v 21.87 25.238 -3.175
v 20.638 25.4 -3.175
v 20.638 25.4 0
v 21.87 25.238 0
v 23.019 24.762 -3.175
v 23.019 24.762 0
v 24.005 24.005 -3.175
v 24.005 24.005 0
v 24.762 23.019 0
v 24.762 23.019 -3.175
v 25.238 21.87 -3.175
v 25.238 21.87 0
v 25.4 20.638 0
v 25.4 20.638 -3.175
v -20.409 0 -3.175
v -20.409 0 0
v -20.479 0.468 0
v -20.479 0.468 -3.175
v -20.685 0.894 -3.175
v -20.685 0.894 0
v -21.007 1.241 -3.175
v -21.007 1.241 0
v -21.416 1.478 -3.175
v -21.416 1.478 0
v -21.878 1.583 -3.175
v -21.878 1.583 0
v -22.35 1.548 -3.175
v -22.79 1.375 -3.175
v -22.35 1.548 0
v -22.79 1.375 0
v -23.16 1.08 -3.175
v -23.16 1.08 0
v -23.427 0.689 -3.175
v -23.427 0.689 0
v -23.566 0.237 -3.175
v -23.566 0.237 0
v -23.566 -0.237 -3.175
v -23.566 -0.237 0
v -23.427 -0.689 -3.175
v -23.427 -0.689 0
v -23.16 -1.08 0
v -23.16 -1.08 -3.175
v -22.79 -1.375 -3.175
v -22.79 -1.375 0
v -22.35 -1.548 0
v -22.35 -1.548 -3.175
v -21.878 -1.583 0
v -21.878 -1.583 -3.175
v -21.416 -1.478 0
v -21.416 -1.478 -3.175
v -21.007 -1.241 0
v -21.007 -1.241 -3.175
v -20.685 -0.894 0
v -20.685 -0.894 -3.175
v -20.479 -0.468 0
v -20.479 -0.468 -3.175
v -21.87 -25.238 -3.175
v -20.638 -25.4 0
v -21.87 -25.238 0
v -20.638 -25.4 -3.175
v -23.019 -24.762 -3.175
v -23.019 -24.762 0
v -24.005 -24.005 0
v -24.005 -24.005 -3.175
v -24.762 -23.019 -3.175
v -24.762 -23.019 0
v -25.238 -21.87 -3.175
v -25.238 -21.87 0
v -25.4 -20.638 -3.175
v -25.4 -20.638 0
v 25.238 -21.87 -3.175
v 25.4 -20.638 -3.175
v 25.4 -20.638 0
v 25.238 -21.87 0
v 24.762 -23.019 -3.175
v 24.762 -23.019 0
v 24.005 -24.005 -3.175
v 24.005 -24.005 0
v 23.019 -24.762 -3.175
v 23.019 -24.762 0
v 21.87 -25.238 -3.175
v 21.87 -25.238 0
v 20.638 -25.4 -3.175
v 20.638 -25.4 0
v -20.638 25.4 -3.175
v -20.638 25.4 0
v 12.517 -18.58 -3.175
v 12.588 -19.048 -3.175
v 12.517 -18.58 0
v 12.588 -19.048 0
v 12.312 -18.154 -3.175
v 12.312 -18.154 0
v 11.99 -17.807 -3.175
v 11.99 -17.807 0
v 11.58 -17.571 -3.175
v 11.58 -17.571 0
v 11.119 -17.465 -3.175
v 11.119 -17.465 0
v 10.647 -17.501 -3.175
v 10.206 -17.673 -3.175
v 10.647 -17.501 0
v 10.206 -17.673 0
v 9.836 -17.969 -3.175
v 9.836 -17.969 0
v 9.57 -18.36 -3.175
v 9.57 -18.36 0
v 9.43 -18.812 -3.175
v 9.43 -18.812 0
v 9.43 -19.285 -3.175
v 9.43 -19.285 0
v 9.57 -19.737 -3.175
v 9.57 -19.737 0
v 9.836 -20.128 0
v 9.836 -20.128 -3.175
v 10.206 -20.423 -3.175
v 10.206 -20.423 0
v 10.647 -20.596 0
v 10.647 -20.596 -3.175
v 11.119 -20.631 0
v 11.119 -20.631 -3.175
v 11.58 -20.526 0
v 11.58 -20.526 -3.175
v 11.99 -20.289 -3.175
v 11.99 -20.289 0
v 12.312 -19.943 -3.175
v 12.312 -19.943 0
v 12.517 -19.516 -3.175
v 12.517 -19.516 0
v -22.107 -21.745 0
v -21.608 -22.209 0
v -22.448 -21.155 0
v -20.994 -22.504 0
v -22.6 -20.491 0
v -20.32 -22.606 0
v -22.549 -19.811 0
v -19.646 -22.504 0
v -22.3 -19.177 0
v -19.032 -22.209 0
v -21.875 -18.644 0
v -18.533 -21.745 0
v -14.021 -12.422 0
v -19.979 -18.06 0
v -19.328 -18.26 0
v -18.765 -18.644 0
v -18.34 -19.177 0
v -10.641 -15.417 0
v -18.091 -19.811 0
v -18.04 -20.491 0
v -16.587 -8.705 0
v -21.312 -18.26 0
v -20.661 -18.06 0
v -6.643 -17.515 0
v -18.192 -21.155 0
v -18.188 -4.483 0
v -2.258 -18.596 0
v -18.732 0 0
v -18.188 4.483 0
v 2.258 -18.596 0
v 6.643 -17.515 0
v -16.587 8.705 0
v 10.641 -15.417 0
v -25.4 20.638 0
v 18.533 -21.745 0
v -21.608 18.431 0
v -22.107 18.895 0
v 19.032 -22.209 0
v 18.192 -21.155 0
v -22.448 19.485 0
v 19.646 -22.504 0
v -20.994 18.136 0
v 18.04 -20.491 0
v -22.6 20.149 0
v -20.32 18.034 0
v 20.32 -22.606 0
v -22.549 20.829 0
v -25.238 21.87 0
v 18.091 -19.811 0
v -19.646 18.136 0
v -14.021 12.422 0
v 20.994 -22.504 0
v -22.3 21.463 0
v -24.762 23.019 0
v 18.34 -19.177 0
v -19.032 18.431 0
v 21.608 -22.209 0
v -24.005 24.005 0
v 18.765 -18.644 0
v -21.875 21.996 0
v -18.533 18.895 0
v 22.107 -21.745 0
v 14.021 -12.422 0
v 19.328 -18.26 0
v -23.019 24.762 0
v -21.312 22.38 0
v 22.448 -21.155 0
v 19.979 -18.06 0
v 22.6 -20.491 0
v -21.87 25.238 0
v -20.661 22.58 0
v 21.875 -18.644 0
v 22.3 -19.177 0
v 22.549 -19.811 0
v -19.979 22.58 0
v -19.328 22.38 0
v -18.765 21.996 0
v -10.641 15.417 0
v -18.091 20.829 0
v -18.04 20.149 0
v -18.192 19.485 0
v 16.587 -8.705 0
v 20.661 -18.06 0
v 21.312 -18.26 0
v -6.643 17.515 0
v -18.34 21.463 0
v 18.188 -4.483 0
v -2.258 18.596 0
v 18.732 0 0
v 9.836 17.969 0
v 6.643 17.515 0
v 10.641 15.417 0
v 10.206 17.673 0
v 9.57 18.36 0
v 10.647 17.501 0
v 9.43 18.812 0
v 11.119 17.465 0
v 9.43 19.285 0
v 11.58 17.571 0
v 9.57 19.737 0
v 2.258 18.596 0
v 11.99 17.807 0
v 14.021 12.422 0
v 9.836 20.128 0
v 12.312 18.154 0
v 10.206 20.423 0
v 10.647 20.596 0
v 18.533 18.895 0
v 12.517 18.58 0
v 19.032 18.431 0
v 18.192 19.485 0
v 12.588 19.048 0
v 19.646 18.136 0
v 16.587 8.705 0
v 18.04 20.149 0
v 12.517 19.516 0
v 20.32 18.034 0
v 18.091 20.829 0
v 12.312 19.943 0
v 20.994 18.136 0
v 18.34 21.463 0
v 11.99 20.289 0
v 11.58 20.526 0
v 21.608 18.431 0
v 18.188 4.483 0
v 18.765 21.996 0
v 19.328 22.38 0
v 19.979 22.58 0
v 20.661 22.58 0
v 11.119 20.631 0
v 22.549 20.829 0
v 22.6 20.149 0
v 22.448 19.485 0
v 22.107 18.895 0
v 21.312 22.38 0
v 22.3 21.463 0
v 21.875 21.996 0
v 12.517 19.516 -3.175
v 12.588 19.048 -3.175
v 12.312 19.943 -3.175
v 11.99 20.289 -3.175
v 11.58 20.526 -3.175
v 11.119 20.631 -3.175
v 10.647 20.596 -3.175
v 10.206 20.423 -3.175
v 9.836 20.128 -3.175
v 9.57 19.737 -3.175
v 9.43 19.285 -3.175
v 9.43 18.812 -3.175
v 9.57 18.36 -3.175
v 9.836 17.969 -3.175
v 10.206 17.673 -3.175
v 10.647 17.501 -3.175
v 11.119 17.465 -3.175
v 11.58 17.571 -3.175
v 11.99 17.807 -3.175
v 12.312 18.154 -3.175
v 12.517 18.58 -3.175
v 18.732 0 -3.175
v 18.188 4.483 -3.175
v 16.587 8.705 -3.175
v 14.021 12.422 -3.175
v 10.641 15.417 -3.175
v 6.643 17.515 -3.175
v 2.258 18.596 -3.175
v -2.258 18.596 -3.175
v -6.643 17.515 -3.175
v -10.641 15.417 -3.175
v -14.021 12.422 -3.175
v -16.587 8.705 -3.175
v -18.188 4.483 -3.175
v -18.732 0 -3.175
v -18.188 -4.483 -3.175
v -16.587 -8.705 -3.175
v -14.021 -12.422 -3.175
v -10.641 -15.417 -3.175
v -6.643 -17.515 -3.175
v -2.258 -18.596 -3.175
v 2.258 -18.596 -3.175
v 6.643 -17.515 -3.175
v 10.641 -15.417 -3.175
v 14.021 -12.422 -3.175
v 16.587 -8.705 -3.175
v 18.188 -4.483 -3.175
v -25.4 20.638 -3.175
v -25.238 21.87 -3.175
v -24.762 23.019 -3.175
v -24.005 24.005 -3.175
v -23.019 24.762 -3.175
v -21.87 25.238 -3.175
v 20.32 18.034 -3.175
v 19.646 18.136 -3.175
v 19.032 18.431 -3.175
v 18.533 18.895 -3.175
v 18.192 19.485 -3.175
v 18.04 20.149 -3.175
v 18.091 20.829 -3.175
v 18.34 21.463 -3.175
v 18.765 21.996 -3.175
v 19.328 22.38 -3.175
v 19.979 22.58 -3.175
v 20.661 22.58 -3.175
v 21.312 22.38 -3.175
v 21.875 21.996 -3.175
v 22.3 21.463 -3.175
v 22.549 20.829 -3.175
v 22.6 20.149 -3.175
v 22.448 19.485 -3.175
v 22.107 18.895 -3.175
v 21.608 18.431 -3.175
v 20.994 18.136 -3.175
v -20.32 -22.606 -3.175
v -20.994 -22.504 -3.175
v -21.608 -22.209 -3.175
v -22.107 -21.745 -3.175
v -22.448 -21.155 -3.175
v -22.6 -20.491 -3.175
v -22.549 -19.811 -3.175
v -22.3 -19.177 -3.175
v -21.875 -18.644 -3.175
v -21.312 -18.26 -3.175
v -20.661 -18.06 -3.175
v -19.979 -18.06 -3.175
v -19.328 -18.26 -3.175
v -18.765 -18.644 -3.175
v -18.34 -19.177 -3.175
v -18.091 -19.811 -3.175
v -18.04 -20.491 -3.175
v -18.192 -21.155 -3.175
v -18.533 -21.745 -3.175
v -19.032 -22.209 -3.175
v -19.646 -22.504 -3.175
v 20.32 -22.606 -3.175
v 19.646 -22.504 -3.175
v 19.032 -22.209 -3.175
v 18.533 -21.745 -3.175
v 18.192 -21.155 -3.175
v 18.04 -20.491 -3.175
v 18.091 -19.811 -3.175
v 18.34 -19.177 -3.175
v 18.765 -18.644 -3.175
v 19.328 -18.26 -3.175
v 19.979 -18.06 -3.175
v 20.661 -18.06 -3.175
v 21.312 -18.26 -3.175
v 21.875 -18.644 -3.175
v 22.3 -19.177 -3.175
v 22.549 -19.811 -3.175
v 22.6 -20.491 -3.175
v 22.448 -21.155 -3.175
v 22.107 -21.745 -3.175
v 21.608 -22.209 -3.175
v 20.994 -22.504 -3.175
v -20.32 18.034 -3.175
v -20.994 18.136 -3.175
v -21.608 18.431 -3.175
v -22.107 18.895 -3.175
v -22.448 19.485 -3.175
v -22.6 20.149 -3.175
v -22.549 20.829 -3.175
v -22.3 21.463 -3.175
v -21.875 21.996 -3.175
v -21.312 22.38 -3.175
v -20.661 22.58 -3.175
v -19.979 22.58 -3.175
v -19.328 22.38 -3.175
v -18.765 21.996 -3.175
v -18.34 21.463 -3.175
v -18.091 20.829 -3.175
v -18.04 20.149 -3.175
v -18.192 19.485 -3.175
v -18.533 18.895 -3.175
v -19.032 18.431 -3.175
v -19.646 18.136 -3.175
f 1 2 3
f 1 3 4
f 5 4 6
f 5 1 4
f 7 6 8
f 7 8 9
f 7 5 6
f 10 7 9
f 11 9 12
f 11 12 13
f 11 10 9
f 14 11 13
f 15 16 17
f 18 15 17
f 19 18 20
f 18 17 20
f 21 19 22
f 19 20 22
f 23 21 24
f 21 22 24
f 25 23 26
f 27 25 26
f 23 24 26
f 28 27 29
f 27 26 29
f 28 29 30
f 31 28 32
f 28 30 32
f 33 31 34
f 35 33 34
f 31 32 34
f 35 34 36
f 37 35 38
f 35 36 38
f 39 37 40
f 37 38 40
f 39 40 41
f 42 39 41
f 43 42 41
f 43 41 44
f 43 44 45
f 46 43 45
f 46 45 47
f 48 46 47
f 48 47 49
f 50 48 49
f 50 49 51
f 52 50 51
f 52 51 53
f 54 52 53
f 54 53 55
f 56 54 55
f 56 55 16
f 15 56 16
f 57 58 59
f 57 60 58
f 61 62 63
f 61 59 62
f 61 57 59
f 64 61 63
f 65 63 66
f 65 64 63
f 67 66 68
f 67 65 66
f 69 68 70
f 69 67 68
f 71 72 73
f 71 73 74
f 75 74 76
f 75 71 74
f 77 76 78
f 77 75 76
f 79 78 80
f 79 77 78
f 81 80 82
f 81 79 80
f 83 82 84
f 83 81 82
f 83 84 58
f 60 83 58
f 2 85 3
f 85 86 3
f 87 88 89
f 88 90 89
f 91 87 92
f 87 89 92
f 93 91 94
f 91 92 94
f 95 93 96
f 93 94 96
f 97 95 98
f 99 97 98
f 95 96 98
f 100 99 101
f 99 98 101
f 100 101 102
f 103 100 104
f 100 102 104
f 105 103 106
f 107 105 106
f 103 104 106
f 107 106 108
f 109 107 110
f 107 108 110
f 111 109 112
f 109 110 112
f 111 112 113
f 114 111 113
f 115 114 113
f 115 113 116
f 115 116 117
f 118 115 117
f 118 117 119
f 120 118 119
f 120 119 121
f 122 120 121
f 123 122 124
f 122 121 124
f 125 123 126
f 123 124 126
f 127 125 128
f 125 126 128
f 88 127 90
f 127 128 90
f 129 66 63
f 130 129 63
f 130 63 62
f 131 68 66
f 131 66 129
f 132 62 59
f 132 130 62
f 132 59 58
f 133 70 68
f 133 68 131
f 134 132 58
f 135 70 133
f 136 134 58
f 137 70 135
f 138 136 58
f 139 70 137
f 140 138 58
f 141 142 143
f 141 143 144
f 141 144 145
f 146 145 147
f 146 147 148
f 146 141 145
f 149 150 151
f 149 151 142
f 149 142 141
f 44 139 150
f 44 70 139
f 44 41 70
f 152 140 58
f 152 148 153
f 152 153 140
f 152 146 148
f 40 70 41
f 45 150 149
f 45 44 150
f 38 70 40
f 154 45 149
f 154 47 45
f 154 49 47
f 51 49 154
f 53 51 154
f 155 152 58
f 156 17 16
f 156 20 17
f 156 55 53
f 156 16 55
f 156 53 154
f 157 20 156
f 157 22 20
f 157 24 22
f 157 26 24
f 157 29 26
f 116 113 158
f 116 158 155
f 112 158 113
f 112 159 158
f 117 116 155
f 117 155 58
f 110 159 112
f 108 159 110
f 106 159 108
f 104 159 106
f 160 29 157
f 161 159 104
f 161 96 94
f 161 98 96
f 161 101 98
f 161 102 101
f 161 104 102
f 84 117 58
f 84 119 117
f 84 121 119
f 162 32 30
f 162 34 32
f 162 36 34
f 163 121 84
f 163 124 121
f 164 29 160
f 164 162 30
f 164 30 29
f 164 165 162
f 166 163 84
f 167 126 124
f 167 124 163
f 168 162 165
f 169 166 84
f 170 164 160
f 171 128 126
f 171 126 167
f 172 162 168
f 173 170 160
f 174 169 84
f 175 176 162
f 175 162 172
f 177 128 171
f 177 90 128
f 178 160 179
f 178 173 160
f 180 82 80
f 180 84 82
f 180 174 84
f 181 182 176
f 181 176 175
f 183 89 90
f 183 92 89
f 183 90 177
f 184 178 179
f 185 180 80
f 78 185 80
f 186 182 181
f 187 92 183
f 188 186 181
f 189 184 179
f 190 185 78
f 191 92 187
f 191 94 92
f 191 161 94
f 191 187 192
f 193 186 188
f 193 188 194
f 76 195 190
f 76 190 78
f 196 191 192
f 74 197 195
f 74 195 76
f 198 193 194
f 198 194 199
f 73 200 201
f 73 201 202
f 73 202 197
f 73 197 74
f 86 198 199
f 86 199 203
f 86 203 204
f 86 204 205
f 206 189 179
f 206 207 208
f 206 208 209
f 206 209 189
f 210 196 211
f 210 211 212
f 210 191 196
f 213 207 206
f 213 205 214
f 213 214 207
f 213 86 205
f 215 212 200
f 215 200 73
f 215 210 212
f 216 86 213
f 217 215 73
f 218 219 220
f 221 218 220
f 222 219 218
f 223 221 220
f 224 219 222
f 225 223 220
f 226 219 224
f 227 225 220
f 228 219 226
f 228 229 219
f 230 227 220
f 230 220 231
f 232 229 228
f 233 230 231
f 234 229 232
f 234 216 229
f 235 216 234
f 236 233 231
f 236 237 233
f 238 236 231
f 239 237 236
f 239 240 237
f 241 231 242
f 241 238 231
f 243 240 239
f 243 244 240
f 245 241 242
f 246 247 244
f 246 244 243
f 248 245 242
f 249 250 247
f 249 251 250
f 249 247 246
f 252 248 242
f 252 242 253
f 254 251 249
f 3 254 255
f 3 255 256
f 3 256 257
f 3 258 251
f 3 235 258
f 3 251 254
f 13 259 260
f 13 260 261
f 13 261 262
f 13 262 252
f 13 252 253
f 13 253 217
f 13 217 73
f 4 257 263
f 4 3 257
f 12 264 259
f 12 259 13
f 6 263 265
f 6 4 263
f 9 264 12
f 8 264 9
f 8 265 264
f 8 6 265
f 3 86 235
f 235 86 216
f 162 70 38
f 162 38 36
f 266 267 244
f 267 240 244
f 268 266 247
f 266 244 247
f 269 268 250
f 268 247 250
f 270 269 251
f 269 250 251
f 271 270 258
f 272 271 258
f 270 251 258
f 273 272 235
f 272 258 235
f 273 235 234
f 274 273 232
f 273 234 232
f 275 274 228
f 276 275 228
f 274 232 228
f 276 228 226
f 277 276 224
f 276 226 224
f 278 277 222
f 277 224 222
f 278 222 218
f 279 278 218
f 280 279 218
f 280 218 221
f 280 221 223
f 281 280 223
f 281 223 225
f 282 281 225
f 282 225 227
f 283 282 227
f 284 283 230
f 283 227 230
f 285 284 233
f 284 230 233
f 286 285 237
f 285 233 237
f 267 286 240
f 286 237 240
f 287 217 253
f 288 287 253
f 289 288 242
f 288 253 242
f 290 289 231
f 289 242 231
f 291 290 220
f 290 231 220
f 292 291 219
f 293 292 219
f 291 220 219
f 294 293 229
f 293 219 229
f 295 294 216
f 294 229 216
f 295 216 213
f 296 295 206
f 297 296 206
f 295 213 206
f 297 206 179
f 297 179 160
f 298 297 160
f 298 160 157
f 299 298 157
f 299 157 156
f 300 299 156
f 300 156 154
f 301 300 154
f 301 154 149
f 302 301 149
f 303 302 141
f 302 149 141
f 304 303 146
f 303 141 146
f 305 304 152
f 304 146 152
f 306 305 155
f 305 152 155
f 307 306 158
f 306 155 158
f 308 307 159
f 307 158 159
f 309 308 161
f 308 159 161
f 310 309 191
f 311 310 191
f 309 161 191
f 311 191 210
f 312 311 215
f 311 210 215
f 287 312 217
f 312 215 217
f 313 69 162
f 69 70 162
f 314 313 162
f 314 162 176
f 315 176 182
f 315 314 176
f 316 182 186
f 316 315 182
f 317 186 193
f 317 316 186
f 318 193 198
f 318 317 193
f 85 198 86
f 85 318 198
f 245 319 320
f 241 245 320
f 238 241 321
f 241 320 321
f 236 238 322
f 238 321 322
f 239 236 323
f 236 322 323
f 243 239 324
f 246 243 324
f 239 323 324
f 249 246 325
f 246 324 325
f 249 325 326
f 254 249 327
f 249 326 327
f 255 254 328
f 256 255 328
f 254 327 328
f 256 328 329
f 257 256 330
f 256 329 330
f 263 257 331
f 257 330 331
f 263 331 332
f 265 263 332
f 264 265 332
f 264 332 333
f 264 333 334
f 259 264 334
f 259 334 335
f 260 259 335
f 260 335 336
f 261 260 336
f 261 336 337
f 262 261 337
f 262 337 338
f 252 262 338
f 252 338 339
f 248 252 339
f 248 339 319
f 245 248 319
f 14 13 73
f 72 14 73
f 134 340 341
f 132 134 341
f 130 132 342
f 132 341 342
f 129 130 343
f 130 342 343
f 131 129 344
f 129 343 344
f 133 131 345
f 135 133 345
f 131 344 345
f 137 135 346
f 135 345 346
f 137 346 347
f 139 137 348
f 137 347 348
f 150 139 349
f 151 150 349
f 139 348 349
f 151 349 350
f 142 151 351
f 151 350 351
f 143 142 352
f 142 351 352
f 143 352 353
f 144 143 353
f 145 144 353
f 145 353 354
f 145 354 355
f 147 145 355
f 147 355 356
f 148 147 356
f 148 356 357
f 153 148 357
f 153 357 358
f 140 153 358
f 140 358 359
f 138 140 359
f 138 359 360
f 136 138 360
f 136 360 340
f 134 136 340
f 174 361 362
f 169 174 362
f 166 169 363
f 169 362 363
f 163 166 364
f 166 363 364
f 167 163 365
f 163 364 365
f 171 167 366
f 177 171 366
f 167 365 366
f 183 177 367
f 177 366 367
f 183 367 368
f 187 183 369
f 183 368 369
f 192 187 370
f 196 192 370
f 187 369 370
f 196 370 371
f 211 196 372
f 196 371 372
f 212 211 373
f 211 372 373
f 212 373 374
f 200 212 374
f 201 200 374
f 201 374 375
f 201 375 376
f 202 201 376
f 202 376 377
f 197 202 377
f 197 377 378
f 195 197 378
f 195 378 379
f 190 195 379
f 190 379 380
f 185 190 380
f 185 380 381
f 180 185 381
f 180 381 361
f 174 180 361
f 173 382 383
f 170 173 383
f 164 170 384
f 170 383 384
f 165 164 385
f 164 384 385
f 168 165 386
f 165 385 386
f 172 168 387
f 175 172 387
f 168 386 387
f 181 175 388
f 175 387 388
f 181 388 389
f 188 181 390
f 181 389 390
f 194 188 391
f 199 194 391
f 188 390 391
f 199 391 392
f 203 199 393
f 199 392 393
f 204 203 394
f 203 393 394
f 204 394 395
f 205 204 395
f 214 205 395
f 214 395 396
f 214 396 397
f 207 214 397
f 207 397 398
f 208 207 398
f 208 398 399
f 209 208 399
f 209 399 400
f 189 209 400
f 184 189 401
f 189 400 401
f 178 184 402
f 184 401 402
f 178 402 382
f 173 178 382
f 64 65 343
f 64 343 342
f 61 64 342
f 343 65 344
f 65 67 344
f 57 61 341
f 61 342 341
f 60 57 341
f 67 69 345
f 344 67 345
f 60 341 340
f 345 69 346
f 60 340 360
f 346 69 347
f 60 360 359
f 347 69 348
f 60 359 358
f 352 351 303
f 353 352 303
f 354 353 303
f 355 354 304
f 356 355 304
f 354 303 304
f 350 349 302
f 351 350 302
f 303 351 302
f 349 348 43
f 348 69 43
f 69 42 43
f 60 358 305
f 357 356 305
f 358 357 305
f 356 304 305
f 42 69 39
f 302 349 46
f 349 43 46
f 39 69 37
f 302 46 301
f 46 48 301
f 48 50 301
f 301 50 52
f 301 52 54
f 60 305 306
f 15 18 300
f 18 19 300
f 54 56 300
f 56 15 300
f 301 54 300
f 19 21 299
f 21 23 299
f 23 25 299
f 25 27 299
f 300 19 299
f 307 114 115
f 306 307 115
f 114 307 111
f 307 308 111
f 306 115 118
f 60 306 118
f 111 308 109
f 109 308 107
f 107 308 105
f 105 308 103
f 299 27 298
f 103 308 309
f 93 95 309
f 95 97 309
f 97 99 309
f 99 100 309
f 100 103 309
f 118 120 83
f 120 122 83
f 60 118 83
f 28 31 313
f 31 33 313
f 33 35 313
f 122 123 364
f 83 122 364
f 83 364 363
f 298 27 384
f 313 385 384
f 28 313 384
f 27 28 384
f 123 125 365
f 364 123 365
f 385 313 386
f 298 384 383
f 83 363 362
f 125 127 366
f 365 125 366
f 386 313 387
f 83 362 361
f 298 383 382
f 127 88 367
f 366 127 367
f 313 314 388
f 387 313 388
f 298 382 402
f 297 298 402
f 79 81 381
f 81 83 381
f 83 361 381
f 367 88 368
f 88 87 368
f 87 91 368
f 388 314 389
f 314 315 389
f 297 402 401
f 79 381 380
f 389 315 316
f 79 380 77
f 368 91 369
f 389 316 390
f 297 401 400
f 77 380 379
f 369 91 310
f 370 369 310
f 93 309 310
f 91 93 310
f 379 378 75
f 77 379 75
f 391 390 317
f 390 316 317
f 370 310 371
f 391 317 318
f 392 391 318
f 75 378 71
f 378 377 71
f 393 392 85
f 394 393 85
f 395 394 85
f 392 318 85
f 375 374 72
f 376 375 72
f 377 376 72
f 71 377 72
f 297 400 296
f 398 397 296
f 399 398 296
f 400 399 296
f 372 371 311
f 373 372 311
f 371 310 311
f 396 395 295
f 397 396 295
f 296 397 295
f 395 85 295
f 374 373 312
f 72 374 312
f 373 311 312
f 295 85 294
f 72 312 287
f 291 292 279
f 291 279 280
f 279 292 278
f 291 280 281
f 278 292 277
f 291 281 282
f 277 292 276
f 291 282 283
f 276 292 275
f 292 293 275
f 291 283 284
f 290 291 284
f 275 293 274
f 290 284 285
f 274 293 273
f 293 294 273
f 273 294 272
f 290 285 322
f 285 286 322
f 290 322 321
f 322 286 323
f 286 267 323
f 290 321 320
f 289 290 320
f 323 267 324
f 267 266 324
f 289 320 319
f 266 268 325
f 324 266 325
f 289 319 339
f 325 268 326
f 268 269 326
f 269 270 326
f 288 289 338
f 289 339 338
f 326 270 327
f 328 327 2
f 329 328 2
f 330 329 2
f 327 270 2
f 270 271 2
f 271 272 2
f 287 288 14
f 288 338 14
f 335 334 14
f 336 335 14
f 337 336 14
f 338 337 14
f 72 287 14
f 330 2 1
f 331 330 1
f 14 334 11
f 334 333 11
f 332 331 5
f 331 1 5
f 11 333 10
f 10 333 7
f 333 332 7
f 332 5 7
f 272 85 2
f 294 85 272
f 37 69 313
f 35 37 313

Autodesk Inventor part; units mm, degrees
ref_plane "YZ Plane" through (0, 0, 0) normal (1, 0, 0) x (0, 1, 0)
ref_plane "XZ Plane" through (0, 0, 0) normal (0, 1, 0) x (-1, 0, 0)
ref_plane "XY Plane" through (0, 0, 0) normal (0, 0, 1) x (1, 0, 0)
sketch "Sketch1" plane through (0, 0, 0) normal (0, 0, 1) x (1, 0, 0)
  line L0 (-13, 12) -> (13, 12)
  line L1 (13, 12) -> (13, -12)
  line L2 (13, -12) -> (-13, -12)
  line L3 (-13, -12) -> (-13, 12)
  line L4 (-13, 3.25) -> (-15, 3.25)
  line L5 (-15, 3.25) -> (-15, -3.25)
  line L6 (-15, -3.25) -> (-13, -3.25)
  line L7 (-13, -3.25) -> (-13, 3.25)
  line L8 (13, 3.25) -> (15, 3.25)
  line L9 (15, 3.25) -> (15, -3.25)
  line L10 (15, -3.25) -> (13, -3.25)
  line L11 (13, -3.25) -> (13, 3.25)
  line L12 (-25.4, 25.4) -> (25.4, 25.4)
  line L13 (25.4, 25.4) -> (25.4, -25.4)
  line L14 (25.4, -25.4) -> (-25.4, -25.4)
  line L15 (-25.4, -25.4) -> (-25.4, 25.4)
  circle A0 centre (0, 0) radius 7.1437
  circle A1 centre (-3, 12) radius 1.5
  line L16 (-13, 8) -> (-9, 12)
  line L17 (9, 12) -> (13, 8)
  line L18 (13, -8) -> (9, -12)
  line L19 (-13, -8) -> (-9, -12)
  circle A2 centre (0, 0) radius 18.7325
  circle A3 centre (-21.9964, 0) radius 1.5875
  circle A4 centre (11.0001, 19.0483) radius 1.5875
  circle A5 centre (11.0001, -19.0483) radius 1.5875
  circle A6 centre (0, 0) radius 21.9964 construction
  point P0 (-14, 3.25)
  point P1 (14, 3.25)
  point P2 (-14, -3.25)
  point P3 (14, -3.25)
  point P4 (-20.32, 20.32)
  point P5 (20.32, 20.32)
  point P6 (20.32, -20.32)
  point P7 (-20.32, -20.32)
  dimension "d0" = 24
  dimension "d1" = 12
  dimension "d2" = 26
  dimension "d3" = 13
  dimension "d4" = 2
  dimension "d5" = 6.5
  dimension "d6" = 3.25
  dimension "d7" = 2
  dimension "d8" = 14.2875
  dimension "d9" = 50.8
  dimension "d10" = 25.4
  dimension "d11" = 50.8
  dimension "d12" = 25.4
  dimension "d13" = 3
  dimension "d14" = 10
  dimension "d15" = 4
  dimension "d16" = 4
  dimension "d17" = 4
  dimension "d18" = 4
  dimension "d19" = 4
  dimension "d20" = 5.08
  dimension "d21" = 5.08
  dimension "d22" = 5.08
  dimension "d23" = 5.08
  dimension "d34" = 40.64
  dimension "d35" = 40.64
  dimension "d44" = 37.465
  dimension "d45" = 3.175
  dimension "d46" = 3.175
  dimension "d47" = 3.175
  dimension "d48" = 38.1
  dimension "d50" = 38.1
  dimension "d57" = 43.9928
  dimension "d58" = 38.0966
extrude "Extrusion1" add sketch "Sketch1" against normal blind 3.175 contours L0 L16 L3 | L0 L1 L17 | L19 L2 L3 | L18 L1 L2 | L12 L13 L14 L15 | A2 | A3 | A4 | A5
fillet "Fillet1" radius 3.175 4 edges at (-13, -3.25, -1.5875) (-13, 3.25, -1.5875) (13, 3.25, -1.5875) (13, -3.25, -1.5875)
hole "Hole1" at (-20.32, 20.32, 0) at (20.32, 20.32, 0) at (20.32, -20.32, 0) at (-20.32, -20.32, 0) direction (0, 0, -1) diameter 4.572 end through all
extrude "Extrusion2" cut sketch "Sketch1" against normal blind 25.4 contours L0 L16 L3 | L0 A1 L17 L1 L18 L2 L19 L3 L16 | L0 A1 | L0 L1 L17 | L19 L2 L3 | L18 L1 L2 | A0 | A2 | A3 | A4 | A5 picked at (-3.284, 11.1238)
fillet "Fillet2" radius 4.7625 4 edges at (25.4, 25.4, -1.5875) (-25.4, 25.4, -1.5875) (25.4, -25.4, -1.5875) (-25.4, -25.4, -1.5875)
equation "\"d1\" = 0.5 * d0"
equation "\"d3\" = 0.5 * d2"
equation "\"d6\" = 0.5 * d5"
equation "\"d7\" = d4"
equation "\"d10\" = 0.5 * d9"
equation "\"d12\" = 0.5 * d11"
equation "\"d16\" = d15"
equation "\"d17\" = d15"
equation "\"d18\" = d15"
equation "\"d19\" = d15"
equation "\"d22\" = d21"
equation "\"d23\" = d21"
equation "\"d46\" = d45"
equation "\"d47\" = d45"
properties part number "BD gearbox mount block"
